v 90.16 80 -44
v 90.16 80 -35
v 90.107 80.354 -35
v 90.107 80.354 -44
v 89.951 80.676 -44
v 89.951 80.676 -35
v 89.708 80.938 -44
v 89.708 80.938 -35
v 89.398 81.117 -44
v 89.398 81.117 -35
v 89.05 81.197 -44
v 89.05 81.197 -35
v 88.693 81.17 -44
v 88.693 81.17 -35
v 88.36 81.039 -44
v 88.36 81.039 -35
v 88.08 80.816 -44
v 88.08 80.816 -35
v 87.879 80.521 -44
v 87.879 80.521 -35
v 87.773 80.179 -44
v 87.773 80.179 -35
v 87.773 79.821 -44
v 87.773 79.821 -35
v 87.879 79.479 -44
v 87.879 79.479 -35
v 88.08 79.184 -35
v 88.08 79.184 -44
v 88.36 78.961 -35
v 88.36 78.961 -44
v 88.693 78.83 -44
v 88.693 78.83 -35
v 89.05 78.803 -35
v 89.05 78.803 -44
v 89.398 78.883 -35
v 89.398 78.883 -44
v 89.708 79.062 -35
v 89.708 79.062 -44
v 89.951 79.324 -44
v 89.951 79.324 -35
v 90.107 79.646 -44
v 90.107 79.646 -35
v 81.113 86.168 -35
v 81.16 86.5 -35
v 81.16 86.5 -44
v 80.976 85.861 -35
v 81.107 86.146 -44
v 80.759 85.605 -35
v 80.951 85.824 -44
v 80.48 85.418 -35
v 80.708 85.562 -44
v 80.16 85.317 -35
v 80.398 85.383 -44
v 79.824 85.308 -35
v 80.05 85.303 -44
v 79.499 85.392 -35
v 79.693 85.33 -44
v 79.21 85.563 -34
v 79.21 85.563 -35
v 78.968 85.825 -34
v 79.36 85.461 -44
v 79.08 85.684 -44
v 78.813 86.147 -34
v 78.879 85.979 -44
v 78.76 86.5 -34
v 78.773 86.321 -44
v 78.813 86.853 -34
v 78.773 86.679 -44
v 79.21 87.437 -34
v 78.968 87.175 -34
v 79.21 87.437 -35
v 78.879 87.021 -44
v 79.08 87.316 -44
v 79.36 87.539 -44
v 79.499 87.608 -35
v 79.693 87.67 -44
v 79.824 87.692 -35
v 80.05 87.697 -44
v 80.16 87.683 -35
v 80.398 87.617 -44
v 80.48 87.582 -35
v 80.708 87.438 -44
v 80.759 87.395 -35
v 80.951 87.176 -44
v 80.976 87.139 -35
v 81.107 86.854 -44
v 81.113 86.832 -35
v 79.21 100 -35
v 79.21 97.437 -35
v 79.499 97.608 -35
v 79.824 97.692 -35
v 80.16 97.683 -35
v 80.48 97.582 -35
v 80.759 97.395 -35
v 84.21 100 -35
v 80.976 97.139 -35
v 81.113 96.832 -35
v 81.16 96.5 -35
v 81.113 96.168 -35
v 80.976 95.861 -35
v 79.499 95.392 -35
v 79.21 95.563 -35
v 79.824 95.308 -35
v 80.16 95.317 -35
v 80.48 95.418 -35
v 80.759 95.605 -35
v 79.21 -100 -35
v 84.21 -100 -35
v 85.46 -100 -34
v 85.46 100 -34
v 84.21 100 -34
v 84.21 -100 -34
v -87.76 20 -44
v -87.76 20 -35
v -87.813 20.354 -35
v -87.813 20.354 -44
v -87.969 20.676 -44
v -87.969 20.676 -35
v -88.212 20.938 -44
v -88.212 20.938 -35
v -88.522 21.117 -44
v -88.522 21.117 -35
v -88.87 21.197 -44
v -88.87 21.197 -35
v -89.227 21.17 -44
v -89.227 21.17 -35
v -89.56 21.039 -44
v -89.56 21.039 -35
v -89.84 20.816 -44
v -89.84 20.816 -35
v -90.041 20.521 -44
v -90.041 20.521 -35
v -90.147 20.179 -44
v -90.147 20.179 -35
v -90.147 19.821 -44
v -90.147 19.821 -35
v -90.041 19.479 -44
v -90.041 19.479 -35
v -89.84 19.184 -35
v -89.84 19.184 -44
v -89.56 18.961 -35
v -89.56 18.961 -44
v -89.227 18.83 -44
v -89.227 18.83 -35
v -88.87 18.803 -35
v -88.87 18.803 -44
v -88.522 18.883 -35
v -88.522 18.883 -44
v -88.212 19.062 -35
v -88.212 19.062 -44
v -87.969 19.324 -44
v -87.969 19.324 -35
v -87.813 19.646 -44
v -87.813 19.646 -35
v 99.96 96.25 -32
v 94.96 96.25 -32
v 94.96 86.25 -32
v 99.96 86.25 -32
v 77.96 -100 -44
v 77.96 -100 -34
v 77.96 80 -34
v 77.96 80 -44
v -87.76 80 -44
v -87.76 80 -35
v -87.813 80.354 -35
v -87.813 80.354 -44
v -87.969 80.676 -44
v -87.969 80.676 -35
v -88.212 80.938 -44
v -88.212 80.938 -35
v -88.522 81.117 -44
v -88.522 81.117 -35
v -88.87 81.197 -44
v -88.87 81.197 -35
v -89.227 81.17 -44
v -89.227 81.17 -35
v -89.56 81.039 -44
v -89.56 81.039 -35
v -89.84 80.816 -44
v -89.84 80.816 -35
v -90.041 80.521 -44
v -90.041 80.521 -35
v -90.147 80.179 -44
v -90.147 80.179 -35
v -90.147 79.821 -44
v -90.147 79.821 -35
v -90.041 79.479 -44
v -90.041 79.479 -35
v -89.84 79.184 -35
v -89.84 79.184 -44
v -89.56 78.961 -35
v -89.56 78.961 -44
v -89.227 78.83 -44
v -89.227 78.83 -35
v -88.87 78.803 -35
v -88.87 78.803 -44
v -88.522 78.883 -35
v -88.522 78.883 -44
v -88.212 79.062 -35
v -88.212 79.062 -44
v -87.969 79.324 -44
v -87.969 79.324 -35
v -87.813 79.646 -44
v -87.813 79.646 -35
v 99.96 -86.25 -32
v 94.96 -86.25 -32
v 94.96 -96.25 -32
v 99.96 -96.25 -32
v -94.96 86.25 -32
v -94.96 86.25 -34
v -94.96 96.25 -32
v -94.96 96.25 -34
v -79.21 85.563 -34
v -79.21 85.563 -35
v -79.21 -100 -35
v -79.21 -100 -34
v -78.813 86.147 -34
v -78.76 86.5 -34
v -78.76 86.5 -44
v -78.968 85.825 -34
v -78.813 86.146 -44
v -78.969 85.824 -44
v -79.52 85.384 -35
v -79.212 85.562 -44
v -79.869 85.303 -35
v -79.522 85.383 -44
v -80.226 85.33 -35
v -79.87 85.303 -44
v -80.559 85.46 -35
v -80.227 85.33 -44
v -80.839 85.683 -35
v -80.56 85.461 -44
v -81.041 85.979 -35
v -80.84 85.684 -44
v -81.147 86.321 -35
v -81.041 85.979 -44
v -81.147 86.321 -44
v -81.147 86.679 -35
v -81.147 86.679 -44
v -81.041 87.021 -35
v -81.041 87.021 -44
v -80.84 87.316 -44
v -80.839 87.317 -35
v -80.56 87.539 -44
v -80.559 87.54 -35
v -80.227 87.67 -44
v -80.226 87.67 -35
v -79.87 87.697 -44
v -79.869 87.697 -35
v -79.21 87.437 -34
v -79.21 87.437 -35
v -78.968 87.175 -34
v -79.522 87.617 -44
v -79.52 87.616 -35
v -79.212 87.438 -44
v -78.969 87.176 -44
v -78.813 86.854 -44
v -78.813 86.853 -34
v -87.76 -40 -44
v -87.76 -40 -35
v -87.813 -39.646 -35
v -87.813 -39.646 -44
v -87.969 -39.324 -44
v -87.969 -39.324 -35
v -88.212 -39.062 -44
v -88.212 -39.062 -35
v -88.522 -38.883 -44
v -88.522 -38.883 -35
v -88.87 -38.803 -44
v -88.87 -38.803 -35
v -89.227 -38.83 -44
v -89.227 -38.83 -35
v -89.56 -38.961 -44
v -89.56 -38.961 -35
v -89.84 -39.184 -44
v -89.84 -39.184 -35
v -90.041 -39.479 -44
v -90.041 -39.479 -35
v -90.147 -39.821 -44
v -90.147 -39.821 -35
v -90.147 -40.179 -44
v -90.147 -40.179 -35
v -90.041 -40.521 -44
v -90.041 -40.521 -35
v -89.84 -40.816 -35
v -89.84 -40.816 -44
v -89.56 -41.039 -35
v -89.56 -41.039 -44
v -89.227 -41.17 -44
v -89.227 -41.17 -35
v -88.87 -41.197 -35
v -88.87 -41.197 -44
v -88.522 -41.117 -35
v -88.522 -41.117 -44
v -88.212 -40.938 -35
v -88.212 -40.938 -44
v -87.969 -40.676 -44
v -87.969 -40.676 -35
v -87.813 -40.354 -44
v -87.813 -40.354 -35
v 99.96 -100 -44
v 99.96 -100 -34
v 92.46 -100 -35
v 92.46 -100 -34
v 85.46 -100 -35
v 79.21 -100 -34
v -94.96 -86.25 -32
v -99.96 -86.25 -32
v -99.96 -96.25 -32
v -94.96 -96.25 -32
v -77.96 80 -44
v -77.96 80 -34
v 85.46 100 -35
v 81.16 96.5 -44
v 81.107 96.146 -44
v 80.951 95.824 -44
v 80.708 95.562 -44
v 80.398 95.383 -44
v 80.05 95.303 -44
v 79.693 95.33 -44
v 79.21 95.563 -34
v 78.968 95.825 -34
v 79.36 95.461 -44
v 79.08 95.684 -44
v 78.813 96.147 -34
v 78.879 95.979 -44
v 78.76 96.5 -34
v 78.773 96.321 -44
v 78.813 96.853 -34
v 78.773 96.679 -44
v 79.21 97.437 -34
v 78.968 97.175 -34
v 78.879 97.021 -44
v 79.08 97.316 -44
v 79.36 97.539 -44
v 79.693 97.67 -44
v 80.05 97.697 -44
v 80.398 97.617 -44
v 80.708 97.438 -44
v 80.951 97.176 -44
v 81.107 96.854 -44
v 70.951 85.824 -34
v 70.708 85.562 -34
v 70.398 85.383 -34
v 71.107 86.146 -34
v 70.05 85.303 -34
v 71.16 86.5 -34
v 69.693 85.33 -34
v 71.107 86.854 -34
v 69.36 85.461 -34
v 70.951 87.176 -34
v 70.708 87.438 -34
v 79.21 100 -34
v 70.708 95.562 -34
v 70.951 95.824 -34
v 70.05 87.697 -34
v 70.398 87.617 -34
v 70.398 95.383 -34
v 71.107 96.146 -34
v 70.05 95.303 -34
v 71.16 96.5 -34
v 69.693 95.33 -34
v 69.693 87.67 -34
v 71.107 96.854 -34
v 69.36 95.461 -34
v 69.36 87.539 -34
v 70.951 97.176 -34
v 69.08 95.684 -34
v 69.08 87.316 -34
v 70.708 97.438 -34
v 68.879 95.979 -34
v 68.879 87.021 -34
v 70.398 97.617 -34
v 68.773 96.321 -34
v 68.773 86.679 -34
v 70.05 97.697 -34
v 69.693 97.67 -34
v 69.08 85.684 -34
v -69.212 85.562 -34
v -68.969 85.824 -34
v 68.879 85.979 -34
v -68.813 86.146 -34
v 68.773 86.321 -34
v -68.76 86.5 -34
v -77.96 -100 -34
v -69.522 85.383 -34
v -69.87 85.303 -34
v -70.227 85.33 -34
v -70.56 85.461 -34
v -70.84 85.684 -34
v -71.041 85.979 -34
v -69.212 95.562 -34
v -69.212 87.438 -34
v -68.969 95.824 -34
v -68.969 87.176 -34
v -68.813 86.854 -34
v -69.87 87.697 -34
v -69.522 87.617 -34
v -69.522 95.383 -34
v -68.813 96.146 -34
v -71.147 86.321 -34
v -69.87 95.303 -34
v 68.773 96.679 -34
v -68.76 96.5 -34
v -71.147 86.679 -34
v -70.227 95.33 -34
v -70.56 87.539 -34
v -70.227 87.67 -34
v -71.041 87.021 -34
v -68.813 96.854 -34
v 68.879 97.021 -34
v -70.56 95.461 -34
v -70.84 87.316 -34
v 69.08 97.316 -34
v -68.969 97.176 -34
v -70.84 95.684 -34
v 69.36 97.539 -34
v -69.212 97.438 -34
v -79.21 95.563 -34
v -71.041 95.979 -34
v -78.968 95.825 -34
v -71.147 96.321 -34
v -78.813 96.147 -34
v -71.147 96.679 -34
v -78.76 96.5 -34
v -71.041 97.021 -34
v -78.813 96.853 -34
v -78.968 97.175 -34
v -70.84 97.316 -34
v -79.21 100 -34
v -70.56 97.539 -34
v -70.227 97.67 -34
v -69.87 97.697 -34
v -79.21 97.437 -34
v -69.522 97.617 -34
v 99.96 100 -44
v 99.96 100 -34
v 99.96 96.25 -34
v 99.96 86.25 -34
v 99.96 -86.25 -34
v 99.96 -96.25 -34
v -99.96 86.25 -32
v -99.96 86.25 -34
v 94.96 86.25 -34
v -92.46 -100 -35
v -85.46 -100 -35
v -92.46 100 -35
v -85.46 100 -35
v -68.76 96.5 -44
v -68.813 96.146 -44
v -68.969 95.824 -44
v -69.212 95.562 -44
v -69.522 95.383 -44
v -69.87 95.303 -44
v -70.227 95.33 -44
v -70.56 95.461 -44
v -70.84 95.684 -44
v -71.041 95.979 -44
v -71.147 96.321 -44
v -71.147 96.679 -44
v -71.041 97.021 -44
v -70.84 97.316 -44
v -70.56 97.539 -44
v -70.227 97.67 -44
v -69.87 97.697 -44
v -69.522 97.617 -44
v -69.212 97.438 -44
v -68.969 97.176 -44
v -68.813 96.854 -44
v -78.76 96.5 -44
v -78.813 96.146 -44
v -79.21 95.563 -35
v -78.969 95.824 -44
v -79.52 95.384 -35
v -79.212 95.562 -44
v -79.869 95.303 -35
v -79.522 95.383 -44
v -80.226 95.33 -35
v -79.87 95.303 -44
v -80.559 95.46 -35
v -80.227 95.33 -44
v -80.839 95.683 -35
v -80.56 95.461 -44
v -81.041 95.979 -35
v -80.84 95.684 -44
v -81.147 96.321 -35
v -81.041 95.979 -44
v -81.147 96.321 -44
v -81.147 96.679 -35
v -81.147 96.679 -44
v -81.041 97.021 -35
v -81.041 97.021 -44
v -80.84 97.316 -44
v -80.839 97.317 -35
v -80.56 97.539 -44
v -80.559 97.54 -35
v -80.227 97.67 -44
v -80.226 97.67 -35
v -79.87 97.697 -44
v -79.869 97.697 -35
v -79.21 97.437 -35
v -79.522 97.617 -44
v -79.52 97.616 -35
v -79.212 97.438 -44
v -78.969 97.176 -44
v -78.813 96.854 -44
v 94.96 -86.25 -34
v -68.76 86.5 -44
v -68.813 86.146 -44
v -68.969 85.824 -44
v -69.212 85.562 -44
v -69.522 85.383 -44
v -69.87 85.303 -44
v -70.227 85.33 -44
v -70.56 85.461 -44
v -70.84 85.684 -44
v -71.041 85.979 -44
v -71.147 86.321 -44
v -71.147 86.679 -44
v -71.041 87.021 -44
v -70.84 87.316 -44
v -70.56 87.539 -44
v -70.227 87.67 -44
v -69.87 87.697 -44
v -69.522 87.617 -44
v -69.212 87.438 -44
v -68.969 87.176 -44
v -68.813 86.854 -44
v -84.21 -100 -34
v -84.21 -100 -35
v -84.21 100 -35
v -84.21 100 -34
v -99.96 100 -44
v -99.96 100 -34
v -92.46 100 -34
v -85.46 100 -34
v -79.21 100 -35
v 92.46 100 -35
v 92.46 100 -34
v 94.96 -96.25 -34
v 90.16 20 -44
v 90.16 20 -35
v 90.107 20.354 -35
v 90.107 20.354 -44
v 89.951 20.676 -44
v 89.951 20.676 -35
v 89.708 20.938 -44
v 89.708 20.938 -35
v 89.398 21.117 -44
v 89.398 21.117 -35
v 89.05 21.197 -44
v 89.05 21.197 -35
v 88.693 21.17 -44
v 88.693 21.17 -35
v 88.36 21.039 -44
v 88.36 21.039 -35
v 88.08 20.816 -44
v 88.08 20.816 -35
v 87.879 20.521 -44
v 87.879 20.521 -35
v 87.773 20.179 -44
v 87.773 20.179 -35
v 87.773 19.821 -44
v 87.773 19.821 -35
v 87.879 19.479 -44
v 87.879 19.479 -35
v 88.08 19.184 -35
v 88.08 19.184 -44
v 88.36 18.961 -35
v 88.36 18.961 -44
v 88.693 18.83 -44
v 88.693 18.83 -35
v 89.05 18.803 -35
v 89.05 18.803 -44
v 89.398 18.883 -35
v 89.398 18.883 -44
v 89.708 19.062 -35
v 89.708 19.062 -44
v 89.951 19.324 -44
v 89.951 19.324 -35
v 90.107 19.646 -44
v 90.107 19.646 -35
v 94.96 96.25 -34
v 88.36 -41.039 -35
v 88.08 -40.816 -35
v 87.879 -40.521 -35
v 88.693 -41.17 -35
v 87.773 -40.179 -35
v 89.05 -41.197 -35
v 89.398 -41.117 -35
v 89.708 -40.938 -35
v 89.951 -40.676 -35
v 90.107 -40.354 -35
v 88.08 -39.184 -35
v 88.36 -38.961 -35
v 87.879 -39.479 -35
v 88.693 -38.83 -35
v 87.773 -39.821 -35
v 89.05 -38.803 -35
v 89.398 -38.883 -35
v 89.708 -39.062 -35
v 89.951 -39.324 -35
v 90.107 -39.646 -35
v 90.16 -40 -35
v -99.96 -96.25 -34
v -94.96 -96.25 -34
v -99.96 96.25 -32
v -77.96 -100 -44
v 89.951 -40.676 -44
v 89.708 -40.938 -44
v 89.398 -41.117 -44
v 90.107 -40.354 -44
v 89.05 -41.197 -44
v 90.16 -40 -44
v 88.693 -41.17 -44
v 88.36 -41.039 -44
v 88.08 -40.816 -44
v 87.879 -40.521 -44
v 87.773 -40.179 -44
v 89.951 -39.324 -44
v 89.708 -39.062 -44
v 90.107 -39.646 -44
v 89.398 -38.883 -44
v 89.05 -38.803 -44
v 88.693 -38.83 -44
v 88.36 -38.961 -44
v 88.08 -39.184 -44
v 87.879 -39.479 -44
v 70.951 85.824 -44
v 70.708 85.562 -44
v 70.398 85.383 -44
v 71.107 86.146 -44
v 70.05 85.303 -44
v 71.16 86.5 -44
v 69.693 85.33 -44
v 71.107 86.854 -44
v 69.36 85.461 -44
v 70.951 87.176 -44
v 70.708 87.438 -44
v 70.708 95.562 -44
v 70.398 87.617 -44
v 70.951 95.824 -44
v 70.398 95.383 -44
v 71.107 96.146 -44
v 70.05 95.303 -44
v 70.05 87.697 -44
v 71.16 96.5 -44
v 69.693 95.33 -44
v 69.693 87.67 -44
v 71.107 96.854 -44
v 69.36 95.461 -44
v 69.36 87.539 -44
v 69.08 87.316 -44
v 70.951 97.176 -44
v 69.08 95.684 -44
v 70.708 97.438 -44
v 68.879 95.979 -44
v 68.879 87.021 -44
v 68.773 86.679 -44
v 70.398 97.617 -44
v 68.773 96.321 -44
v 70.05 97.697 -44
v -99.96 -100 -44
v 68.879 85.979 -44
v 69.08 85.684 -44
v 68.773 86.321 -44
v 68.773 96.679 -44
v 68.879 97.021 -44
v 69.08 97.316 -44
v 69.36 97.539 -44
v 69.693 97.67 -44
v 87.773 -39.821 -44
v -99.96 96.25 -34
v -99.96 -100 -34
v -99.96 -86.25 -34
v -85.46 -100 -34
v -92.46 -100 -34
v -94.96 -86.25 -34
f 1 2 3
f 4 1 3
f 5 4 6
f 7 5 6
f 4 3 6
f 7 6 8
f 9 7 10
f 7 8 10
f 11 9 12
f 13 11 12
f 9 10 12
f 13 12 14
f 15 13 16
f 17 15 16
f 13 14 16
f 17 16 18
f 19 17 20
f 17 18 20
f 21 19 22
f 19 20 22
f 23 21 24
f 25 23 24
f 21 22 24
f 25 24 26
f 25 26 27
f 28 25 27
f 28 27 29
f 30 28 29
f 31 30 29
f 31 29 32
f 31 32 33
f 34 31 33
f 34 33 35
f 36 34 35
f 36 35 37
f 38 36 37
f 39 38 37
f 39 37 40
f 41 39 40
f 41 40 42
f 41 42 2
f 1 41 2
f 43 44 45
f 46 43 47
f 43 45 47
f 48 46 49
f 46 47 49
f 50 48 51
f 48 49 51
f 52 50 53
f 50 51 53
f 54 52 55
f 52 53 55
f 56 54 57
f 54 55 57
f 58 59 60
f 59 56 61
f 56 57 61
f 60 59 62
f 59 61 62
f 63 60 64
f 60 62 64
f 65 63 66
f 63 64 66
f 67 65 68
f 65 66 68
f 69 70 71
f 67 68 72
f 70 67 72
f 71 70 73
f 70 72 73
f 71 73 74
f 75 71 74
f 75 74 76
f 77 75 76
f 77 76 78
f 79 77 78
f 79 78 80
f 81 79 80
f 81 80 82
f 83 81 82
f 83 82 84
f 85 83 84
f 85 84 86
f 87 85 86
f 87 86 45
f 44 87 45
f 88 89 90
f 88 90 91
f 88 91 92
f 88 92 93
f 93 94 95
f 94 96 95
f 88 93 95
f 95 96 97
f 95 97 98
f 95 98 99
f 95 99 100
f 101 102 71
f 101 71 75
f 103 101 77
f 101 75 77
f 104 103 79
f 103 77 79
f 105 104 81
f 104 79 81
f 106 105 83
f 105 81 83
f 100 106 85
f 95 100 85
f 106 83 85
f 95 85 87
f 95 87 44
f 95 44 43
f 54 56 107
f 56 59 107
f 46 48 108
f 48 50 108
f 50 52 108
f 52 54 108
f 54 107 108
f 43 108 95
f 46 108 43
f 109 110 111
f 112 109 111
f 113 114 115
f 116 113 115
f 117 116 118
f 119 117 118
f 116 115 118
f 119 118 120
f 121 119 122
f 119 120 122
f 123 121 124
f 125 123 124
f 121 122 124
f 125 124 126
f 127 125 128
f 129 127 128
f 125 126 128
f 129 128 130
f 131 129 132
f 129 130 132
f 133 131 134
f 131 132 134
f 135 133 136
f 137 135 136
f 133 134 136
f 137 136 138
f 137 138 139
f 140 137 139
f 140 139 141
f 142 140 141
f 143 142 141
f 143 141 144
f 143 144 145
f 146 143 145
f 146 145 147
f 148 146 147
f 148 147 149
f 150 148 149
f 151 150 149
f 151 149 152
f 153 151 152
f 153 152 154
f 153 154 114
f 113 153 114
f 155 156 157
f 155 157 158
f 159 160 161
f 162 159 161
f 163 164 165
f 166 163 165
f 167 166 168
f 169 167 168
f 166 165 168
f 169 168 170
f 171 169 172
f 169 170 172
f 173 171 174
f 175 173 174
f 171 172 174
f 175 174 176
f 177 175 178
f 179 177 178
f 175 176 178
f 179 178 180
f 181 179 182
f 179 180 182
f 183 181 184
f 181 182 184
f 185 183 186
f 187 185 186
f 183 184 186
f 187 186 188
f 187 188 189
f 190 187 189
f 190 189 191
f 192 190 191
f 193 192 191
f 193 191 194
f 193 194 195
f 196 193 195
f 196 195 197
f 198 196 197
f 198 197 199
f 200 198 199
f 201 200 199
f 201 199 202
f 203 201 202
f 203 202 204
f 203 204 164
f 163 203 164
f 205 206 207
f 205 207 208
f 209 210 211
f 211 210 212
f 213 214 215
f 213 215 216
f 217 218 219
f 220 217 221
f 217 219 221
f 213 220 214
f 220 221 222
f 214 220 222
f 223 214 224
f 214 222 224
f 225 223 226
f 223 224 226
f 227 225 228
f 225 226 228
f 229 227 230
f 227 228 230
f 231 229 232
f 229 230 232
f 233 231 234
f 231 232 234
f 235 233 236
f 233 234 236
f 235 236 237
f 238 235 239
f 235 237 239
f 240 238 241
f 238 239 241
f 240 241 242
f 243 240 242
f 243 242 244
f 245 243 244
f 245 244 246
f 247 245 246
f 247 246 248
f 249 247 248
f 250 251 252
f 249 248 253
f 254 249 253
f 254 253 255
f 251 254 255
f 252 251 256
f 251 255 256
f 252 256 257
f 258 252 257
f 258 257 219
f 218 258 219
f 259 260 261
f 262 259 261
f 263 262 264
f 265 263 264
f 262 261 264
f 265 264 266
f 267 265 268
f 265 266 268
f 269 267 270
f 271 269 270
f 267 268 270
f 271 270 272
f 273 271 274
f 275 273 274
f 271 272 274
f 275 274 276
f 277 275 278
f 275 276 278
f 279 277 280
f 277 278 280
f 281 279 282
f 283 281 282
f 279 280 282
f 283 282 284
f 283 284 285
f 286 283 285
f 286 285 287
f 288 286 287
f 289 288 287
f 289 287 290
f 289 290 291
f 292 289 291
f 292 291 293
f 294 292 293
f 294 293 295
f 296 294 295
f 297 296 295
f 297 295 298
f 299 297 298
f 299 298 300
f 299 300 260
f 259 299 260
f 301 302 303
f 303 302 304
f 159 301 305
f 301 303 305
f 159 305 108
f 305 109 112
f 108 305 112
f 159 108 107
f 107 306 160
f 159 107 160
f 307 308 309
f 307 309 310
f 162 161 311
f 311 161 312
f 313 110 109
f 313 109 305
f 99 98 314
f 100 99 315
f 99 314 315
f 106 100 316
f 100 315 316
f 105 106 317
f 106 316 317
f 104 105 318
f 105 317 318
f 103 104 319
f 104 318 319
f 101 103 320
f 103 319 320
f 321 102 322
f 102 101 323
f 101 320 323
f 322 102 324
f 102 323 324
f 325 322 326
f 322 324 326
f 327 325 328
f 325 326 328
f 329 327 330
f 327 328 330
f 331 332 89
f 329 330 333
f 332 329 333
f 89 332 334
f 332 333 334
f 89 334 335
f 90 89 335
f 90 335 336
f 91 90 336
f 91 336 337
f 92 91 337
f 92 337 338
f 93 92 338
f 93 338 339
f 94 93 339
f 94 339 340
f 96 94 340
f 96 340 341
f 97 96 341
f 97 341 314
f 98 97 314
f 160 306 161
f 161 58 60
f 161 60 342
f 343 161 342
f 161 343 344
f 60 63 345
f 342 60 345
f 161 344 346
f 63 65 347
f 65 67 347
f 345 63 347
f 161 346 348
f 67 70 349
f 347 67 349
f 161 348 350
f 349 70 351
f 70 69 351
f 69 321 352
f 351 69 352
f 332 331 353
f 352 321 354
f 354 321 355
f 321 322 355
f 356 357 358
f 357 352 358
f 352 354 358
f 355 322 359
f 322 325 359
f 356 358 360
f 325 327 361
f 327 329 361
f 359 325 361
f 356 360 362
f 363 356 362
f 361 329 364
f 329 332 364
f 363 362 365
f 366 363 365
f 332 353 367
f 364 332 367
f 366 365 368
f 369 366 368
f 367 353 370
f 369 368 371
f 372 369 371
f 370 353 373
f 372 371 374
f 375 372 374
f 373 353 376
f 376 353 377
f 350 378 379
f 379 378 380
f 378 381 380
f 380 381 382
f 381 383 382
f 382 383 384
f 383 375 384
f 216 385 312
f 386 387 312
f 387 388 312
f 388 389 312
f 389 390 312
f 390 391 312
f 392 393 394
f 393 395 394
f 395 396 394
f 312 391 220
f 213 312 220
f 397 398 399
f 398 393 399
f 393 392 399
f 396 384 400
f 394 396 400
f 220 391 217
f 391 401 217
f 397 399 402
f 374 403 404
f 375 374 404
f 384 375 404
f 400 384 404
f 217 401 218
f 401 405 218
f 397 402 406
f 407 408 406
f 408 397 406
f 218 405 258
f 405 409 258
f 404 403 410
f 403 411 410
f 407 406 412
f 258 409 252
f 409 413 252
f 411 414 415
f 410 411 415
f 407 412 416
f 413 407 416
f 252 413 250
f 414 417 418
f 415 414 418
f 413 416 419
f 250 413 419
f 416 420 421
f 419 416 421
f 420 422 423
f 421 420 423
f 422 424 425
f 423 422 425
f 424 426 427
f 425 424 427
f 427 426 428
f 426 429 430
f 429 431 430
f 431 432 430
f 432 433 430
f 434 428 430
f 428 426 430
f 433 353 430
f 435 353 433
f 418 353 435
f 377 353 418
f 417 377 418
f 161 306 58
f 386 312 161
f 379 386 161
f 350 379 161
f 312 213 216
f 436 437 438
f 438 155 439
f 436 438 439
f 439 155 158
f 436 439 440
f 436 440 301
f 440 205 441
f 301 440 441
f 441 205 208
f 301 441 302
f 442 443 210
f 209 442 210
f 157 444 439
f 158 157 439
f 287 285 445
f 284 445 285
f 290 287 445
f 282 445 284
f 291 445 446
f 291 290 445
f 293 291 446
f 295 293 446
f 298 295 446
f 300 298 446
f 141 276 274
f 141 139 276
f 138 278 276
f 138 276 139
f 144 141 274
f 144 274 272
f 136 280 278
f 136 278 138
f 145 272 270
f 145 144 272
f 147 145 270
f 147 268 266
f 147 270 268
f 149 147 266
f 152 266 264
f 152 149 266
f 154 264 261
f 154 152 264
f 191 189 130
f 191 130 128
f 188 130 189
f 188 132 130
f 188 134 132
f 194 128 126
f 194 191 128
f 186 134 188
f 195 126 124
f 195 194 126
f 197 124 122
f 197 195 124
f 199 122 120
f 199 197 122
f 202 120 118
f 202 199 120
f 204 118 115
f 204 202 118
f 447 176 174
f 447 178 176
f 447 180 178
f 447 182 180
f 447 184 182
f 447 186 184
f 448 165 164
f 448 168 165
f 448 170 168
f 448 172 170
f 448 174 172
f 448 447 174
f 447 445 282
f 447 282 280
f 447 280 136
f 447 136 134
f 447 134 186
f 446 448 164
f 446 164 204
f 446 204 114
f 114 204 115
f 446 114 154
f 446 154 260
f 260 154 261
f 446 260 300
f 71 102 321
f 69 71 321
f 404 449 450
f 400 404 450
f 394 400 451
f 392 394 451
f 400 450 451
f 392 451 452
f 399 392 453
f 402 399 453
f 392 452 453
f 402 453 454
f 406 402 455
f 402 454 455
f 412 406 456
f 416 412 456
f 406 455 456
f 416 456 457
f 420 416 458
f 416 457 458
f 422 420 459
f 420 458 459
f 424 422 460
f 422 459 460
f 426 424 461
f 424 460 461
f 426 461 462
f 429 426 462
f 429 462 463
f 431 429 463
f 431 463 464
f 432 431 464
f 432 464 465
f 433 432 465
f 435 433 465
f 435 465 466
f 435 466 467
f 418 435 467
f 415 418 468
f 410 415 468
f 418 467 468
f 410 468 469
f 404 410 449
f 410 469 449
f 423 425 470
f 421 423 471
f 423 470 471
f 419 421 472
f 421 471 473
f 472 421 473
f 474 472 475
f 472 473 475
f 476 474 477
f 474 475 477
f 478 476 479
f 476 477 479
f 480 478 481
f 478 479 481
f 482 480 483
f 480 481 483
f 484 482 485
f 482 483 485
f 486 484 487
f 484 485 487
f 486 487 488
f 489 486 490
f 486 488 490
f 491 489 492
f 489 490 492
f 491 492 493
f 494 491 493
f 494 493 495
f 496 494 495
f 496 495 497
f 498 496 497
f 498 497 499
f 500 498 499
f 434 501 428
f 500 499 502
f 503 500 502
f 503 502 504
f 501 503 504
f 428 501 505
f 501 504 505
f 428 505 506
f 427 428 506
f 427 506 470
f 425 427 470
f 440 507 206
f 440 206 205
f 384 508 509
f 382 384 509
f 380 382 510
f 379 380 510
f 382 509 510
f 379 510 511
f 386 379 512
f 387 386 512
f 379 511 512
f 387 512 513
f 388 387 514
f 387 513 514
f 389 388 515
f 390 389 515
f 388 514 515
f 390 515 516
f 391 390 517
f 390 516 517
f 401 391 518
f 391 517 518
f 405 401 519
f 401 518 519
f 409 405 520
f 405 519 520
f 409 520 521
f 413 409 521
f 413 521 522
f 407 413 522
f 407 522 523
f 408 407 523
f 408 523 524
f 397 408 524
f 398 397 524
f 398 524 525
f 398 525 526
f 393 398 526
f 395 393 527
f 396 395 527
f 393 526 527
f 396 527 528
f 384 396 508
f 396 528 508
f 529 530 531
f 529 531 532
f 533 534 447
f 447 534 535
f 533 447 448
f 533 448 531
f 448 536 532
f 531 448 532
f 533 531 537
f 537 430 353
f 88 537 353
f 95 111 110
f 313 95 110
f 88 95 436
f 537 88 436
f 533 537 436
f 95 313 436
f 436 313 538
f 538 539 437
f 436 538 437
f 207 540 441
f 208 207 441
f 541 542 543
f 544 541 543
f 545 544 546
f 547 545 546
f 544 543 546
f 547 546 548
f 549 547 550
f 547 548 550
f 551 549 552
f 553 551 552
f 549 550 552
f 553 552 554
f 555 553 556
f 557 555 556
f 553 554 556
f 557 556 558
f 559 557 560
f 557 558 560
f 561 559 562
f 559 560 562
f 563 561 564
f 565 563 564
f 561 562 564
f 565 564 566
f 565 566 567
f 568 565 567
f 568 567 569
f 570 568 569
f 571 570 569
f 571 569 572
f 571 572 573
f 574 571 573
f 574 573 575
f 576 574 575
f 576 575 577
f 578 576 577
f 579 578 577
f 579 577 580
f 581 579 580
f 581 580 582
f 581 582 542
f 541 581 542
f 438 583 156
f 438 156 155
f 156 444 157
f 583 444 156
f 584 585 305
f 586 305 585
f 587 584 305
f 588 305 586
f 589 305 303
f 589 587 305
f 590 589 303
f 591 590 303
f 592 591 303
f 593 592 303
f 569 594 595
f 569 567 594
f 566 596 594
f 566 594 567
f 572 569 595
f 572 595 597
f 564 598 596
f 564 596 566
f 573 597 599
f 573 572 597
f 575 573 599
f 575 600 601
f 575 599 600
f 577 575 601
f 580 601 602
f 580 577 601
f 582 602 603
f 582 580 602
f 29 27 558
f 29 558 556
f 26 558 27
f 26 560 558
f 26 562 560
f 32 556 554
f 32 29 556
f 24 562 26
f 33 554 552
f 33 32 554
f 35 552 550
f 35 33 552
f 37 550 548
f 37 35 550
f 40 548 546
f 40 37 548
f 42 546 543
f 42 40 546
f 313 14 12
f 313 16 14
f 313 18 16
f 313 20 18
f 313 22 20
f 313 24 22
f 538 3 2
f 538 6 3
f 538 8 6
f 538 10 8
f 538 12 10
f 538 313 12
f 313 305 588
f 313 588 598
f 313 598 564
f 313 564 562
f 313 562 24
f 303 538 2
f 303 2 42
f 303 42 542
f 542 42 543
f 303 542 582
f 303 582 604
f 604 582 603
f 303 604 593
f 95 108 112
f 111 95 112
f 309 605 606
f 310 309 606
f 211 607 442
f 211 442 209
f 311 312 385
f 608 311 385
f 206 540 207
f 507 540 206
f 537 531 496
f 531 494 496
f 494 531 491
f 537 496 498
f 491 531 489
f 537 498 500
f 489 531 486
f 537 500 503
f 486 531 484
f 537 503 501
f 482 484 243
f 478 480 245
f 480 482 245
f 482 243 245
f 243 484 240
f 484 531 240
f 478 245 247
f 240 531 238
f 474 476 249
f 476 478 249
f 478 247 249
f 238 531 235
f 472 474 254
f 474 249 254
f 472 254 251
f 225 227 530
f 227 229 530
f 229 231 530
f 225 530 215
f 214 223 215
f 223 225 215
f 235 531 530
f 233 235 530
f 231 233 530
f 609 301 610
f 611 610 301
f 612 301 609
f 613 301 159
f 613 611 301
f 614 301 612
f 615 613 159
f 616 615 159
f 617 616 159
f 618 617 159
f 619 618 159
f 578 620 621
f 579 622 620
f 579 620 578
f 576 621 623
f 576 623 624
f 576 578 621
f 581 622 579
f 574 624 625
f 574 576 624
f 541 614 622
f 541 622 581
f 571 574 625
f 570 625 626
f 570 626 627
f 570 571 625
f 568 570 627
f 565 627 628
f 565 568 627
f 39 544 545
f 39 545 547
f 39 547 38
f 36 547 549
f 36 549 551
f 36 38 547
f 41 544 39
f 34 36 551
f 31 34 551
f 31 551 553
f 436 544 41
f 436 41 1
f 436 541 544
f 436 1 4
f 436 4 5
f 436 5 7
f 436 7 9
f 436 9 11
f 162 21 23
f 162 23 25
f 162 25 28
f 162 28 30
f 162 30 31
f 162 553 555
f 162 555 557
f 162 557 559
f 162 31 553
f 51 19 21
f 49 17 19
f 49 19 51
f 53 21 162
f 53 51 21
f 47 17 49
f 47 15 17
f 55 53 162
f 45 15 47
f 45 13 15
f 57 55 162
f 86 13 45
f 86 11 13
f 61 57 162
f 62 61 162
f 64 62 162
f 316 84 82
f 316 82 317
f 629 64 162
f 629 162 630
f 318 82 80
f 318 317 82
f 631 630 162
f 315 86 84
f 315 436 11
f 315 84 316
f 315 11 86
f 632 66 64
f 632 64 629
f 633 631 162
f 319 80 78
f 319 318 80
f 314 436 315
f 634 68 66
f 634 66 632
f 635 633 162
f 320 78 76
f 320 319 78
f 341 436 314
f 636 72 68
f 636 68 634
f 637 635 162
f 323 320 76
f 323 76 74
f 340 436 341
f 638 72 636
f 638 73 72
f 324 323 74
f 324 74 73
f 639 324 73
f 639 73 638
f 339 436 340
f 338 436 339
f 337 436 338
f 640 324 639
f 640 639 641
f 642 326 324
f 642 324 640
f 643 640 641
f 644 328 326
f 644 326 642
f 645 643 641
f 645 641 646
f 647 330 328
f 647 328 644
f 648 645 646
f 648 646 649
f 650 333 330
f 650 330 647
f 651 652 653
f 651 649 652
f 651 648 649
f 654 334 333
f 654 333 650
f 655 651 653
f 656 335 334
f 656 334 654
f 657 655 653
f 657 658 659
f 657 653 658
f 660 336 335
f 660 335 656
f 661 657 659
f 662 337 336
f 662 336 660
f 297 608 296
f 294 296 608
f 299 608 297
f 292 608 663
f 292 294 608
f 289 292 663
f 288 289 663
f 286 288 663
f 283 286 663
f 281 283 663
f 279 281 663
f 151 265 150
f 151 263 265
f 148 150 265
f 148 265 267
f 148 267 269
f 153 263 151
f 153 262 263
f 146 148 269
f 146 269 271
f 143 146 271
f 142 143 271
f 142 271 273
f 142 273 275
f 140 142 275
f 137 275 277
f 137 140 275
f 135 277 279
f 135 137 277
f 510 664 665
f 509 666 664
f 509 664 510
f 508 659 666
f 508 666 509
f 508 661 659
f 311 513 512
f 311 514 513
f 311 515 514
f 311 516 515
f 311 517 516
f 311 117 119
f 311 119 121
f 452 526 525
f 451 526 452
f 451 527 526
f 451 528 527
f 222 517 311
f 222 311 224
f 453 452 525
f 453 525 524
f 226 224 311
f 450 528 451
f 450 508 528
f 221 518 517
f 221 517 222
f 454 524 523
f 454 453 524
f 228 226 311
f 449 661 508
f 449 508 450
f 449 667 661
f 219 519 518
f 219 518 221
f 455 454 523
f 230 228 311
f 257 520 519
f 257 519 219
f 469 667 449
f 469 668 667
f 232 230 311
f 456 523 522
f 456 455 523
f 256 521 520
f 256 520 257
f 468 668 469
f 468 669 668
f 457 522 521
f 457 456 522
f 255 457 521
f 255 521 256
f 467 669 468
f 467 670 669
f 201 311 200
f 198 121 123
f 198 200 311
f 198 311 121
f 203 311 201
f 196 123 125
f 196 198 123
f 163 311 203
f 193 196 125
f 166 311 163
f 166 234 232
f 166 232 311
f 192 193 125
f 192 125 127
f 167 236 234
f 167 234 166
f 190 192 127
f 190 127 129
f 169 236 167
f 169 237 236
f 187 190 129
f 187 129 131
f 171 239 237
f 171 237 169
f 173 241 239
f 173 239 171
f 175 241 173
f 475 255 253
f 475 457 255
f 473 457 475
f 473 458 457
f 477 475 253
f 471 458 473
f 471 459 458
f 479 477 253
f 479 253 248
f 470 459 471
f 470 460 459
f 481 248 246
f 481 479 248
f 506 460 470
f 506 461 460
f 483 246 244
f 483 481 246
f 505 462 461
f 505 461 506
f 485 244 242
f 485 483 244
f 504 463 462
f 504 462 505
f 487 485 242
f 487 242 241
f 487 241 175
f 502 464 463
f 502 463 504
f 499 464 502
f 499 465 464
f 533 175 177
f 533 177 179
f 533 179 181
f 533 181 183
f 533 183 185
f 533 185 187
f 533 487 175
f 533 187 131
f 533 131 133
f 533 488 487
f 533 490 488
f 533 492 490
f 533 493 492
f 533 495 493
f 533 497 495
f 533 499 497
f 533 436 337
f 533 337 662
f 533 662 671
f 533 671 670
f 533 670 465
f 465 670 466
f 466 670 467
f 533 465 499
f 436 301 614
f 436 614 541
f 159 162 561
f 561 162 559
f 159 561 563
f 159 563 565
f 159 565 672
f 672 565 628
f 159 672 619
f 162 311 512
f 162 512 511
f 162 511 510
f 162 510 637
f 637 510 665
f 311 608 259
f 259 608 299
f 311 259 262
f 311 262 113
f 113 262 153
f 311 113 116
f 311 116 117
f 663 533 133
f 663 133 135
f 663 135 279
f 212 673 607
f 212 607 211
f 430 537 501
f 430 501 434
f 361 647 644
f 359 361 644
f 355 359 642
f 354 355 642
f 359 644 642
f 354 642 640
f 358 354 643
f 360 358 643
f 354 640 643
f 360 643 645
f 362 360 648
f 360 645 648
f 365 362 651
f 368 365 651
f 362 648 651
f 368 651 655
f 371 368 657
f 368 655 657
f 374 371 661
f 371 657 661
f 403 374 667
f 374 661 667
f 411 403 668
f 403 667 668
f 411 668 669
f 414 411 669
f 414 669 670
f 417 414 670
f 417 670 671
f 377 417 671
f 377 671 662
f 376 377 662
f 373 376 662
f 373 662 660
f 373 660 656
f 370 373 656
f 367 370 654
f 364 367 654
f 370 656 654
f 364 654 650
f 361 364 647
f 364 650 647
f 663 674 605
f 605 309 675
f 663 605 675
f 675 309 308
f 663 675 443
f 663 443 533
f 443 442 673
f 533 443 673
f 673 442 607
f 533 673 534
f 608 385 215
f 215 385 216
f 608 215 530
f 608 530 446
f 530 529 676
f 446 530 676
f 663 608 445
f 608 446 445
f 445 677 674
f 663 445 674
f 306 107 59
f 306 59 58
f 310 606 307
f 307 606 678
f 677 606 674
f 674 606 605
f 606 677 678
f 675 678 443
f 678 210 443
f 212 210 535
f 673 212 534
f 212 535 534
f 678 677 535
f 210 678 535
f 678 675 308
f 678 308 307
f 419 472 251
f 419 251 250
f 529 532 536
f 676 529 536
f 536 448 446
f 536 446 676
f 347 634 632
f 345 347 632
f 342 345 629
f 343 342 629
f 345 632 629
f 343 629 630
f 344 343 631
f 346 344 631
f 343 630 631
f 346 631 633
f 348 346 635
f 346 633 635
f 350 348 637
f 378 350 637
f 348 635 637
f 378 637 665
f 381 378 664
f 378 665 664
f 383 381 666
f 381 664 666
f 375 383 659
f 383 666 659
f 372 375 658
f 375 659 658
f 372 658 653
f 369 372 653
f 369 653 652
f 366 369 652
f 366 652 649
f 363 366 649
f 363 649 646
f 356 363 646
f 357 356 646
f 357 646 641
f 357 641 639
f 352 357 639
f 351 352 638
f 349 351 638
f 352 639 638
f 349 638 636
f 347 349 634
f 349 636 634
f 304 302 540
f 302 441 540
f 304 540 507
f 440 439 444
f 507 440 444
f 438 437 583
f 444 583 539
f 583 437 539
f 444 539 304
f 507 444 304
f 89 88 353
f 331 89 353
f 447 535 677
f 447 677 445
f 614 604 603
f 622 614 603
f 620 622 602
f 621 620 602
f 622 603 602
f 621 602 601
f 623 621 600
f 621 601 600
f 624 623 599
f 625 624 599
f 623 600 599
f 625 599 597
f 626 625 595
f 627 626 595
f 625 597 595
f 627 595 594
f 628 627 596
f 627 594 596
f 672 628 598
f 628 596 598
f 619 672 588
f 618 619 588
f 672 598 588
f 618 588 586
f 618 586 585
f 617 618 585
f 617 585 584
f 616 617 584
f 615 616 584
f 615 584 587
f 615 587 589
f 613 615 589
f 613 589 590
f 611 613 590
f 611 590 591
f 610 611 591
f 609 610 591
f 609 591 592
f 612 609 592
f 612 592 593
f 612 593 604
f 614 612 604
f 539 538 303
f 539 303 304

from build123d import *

# Parameters (mm, degrees)
SKETCH003_R     = 1.2
PAD001_DEPTH    = 10
POCKET002_DEPTH = 200
SKETCH011_R     = 1.2
POCKET008_DEPTH = 10
SKETCH030_W     = 5
SKETCH030_H     = 10
PAD012_DEPTH    = 2
SKETCH031_W     = 5
SKETCH031_H     = 1
POCKET018_DEPTH = 200


with BuildPart() as part:
    # Sketch003 → Pad001 (new body)
    with BuildSketch(Plane.XY):
        Polygon((-99.96, 100), (99.96, 100), (99.96, -100), (77.96, -100), (77.96, 80), (-77.96, 80), (-77.96, -100), (-99.96, -100), align=None)
        with Locations((-88.96, 80)):
            Circle(SKETCH003_R, mode=Mode.SUBTRACT)
        with Locations((88.96, 80)):
            Circle(SKETCH003_R, mode=Mode.SUBTRACT)
        with Locations((88.96, 20)):
            Circle(SKETCH003_R, mode=Mode.SUBTRACT)
        with Locations((-88.96, 20)):
            Circle(SKETCH003_R, mode=Mode.SUBTRACT)
        with Locations((-88.96, -40)):
            Circle(SKETCH003_R, mode=Mode.SUBTRACT)
        with Locations((88.96, -40)):
            Circle(SKETCH003_R, mode=Mode.SUBTRACT)
    extrude(amount=-PAD001_DEPTH)

    # Sketch004 (on Face6 of Pad001) → Pocket002 (cut)
    with BuildSketch(Plane(origin=(0, 100, 0), x_dir=(-1, 0, 0), z_dir=(0, 1, 0))):
        Polygon((-85.46, 0), (-85.46, -1), (-92.46, -1), (-92.46, 1), (92.46, 1), (92.46, -1), (85.46, -1), (85.46, 0), align=None)
    extrude(amount=-POCKET002_DEPTH, mode=Mode.SUBTRACT)

    # Sketch011 (on Face5 of Pocket002) → Pocket008 (cut)
    with BuildSketch(Plane(origin=(0, 0, -10), x_dir=(1, 0, 0), z_dir=(0, 0, -1))):
        with Locations((-79.96, -86.5)):
            Circle(SKETCH011_R)
        with Locations((-69.96, -86.5)):
            Circle(SKETCH011_R)
        with Locations((-69.96, -96.5)):
            Circle(SKETCH011_R)
        with Locations((-79.96, -96.5)):
            Circle(SKETCH011_R)
        with Locations((69.96, -86.5)):
            Circle(SKETCH011_R)
        with Locations((79.96, -86.5)):
            Circle(SKETCH011_R)
        with Locations((79.96, -96.5)):
            Circle(SKETCH011_R)
        with Locations((69.96, -96.5)):
            Circle(SKETCH011_R)
    extrude(amount=-POCKET008_DEPTH, mode=Mode.SUBTRACT)

    # Sketch030 (on Face4 of Pocket008) → Pad012 (join)
    with BuildSketch(Plane.XY):
        with Locations((97.46, 91.25)):
            Rectangle(SKETCH030_W, SKETCH030_H)
        with Locations((97.46, -91.25)):
            Rectangle(SKETCH030_W, SKETCH030_H)
        with Locations((-97.46, 91.25)):
            Rectangle(SKETCH030_W, SKETCH030_H)
        with Locations((-97.46, -91.25)):
            Rectangle(SKETCH030_W, SKETCH030_H)
    extrude(amount=PAD012_DEPTH)

    # Sketch031 (on Face2 of Pad012) → Pocket018 (cut)
    with BuildSketch(Plane.XZ.offset(100)):
        with Locations((81.71, -0.5)):
            Rectangle(SKETCH031_W, SKETCH031_H)
        with Locations((-81.71, -0.5)):
            Rectangle(SKETCH031_W, SKETCH031_H)
    extrude(amount=-POCKET018_DEPTH, mode=Mode.SUBTRACT)


with BuildPart() as part_1:
    # Body001 placement: moved
    add(part.part.moved(Location((0, 0, -34))))


solid = part_1.part
